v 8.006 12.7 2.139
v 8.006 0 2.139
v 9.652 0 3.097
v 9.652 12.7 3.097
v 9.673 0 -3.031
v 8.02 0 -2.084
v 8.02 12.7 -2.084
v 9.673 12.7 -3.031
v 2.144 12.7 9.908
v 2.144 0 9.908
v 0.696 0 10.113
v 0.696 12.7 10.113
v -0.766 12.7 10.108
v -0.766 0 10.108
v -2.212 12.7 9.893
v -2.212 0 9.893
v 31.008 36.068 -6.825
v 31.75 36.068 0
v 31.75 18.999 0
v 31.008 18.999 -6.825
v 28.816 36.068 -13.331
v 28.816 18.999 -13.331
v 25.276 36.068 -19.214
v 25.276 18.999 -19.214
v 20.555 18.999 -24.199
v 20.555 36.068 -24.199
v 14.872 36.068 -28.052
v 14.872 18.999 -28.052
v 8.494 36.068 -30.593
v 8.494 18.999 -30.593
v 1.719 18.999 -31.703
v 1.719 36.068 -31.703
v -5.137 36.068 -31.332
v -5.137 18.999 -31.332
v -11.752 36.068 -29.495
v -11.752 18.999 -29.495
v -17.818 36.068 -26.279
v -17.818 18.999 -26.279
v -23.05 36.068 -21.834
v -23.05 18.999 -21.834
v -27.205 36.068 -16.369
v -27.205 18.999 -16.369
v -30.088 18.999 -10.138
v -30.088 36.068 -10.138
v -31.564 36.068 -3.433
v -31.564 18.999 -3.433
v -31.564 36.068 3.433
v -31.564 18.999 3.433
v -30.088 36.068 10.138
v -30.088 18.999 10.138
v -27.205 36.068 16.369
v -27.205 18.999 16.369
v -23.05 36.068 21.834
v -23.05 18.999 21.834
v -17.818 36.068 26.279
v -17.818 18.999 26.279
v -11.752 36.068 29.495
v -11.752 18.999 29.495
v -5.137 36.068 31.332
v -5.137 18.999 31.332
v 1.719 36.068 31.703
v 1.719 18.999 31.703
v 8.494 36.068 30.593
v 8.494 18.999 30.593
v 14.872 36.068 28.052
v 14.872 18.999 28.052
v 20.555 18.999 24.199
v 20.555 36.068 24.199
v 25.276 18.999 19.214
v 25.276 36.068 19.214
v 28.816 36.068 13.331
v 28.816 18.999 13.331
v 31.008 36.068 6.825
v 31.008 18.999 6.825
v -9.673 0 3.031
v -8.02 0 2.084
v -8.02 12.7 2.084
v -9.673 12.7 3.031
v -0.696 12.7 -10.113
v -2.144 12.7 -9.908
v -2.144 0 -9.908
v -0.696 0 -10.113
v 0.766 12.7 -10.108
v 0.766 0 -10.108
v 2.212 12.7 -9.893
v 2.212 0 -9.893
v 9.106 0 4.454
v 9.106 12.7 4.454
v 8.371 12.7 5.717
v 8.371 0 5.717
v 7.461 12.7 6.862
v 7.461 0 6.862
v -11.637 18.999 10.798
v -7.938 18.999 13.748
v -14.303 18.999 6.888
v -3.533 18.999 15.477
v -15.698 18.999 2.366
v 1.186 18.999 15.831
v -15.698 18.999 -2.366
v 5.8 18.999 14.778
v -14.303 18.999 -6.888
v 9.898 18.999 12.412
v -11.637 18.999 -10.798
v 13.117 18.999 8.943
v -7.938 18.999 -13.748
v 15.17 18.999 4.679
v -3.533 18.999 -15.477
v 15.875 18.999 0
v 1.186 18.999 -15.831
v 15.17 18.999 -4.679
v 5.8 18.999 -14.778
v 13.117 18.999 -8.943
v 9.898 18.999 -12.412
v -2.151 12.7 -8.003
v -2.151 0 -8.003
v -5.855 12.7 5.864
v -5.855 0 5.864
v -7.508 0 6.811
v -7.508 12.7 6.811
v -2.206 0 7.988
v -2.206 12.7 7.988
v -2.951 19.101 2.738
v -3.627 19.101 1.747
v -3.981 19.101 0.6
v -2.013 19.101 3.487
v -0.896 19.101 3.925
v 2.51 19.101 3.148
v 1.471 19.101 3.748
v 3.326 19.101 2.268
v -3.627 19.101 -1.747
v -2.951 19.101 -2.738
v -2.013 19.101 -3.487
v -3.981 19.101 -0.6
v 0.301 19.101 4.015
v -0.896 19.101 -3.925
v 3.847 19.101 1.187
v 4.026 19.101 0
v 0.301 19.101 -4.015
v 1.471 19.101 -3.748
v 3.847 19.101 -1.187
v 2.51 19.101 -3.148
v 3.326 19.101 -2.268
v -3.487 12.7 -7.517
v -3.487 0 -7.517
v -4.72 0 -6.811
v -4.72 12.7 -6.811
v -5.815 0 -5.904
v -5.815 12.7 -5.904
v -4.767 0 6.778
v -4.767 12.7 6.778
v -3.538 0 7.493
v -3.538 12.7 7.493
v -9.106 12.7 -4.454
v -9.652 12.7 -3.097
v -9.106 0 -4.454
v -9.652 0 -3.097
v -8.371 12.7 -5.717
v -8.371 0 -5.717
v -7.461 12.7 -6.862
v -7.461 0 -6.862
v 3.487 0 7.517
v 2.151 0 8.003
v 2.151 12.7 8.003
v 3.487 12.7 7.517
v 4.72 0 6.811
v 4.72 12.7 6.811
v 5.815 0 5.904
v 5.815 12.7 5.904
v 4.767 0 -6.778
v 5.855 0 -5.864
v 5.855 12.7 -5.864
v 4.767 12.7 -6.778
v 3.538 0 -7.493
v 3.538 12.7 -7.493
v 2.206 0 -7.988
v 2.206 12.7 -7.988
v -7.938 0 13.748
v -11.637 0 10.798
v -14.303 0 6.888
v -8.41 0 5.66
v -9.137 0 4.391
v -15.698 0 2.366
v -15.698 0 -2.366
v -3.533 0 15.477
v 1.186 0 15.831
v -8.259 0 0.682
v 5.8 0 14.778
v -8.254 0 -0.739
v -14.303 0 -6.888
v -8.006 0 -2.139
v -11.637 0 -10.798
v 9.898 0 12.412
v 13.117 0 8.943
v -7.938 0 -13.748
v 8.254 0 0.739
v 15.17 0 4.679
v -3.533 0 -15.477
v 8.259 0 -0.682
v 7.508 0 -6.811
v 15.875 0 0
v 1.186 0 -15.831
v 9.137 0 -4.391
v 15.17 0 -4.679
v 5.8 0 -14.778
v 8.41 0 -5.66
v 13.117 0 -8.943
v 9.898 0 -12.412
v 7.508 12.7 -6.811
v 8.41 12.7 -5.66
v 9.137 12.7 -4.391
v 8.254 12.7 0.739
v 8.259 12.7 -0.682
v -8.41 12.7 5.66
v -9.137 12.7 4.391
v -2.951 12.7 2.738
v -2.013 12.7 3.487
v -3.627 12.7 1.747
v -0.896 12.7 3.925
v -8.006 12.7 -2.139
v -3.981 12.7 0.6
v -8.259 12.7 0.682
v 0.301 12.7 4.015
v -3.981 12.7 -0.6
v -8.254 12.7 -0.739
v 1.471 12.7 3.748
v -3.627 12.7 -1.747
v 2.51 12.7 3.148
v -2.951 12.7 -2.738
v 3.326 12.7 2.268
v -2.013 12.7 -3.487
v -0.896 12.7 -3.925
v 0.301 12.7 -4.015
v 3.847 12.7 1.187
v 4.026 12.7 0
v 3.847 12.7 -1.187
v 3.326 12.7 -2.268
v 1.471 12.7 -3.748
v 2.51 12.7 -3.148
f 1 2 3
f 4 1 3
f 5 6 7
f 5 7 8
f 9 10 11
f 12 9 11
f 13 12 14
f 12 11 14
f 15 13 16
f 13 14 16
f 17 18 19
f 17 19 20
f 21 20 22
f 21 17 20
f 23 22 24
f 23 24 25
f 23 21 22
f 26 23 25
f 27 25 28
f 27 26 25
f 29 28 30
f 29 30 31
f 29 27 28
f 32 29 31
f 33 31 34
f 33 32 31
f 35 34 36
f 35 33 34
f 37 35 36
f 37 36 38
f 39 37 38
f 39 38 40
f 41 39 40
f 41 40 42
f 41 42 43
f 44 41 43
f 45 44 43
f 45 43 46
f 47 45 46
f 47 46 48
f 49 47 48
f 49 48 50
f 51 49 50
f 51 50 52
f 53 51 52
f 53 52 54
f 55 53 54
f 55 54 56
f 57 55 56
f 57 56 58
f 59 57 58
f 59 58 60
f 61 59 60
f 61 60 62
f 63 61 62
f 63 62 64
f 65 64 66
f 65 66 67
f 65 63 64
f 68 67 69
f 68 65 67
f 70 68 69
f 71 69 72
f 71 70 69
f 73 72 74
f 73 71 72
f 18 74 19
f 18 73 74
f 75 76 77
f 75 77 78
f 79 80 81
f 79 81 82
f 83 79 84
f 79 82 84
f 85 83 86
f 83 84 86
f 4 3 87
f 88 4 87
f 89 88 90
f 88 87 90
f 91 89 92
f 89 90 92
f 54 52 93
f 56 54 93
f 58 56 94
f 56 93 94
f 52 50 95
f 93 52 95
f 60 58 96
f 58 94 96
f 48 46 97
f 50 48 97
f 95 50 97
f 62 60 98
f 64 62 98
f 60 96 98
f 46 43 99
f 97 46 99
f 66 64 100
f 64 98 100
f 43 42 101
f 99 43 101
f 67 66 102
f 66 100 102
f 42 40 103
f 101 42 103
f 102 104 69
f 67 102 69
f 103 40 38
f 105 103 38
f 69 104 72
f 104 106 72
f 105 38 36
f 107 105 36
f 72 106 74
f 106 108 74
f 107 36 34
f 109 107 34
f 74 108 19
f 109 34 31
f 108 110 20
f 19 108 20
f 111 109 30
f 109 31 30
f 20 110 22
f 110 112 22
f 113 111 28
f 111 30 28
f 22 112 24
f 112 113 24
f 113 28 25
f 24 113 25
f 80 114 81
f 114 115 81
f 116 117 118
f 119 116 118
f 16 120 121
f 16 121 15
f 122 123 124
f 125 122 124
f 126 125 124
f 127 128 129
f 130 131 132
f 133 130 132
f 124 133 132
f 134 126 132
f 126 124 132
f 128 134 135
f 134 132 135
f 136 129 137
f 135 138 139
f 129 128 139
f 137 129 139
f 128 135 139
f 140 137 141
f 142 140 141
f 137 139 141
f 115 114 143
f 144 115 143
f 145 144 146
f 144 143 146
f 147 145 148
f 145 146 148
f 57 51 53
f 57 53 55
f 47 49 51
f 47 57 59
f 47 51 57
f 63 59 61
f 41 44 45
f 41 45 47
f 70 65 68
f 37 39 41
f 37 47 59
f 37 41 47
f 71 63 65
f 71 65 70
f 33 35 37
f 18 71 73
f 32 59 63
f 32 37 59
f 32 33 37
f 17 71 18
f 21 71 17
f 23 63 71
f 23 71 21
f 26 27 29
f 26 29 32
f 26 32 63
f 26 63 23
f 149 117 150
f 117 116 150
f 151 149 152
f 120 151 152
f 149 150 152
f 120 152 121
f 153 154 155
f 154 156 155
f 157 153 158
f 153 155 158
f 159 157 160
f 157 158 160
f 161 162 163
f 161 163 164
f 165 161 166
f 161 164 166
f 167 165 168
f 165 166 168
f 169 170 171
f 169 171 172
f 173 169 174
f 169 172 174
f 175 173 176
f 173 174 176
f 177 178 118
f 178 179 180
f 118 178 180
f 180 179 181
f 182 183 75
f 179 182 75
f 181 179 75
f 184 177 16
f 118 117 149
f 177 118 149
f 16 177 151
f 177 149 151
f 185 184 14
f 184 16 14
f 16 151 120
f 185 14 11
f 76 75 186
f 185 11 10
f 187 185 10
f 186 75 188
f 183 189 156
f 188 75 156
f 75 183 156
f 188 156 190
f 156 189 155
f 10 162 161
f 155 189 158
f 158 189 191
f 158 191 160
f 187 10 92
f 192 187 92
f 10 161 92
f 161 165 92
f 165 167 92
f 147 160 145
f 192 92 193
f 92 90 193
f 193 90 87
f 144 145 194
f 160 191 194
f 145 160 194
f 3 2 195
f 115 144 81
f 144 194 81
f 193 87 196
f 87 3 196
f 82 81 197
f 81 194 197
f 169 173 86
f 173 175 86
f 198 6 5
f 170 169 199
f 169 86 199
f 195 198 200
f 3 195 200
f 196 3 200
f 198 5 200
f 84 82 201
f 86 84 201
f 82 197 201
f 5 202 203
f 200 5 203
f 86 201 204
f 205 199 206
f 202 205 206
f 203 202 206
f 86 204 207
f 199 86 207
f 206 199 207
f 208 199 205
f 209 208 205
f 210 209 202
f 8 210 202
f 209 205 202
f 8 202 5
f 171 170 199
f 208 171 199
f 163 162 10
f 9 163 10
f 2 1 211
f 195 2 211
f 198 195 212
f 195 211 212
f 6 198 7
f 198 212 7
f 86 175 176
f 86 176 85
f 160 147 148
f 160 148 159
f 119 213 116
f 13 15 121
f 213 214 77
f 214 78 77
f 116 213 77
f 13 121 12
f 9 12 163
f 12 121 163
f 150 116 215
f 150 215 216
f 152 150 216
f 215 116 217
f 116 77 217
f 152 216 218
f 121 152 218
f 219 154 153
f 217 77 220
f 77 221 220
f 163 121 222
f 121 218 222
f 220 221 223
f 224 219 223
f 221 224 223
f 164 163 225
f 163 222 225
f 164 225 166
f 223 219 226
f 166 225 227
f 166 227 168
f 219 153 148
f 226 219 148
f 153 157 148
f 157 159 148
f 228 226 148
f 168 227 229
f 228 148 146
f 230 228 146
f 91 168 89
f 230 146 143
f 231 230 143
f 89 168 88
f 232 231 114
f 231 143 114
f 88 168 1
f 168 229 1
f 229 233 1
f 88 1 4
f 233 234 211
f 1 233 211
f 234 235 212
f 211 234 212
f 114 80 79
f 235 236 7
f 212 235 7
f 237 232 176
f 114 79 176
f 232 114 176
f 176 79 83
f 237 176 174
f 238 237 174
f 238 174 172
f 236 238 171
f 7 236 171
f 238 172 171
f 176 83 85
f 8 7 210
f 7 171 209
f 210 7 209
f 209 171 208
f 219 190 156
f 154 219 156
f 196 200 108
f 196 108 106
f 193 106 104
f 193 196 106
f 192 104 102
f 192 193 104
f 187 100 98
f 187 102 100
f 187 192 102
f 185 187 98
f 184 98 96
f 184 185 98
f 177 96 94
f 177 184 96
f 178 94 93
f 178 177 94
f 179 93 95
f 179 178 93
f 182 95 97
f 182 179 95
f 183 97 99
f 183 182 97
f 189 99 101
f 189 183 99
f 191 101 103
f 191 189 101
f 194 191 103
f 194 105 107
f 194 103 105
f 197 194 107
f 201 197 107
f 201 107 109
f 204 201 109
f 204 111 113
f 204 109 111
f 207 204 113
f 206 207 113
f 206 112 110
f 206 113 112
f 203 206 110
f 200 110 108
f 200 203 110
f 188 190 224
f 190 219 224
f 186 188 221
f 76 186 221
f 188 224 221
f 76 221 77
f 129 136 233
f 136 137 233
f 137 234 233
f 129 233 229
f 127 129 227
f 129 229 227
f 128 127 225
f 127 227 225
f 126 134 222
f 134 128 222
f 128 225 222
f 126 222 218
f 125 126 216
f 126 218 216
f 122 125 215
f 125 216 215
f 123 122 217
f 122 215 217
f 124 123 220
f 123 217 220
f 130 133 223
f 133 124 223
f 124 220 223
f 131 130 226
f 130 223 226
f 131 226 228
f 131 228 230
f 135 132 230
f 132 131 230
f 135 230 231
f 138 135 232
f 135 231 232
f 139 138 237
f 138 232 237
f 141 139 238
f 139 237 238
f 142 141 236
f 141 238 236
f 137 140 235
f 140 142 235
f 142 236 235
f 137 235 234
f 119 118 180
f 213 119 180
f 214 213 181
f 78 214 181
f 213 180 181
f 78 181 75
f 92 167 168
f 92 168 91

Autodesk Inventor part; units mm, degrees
ref_plane "YZ Plane" through (0, 0, 0) normal (1, 0, 0) x (0, 1, 0)
ref_plane "XZ Plane" through (0, 0, 0) normal (0, 1, 0) x (-1, 0, 0)
ref_plane "XY Plane" through (0, 0, 0) normal (0, 0, 1) x (1, 0, 0)
sketch "Sketch1" plane through (0, 0, 0) normal (0, 0, 1) x (1, 0, 0)
  line L0 (0, 0) -> (0, 50.8) construction
  line L1 (0, 0) -> (50.8, 0) construction
  line L2 (31.75, 18.9992) -> (31.75, 19.1008)
  line L3 (0, 9.5479) -> (15.8115, 9.5479) construction
  line L4 (31.75, 18.9992) -> (15.875, 18.9992)
  line L5 (15.875, 18.9992) -> (15.875, 0)
  line L6 (0, 0) -> (8.2867, 0) construction
  line L7 (8.2867, 0) -> (15.875, 0)
  line L8 (8.2867, 0) -> (8.2867, 12.7)
  line L9 (4.0259, 71.0633) -> (4.0259, -11.3243) construction
  line L10 (8.2867, 12.7) -> (4.0259, 12.7)
  line L11 (4.0259, 19.1008) -> (4.0259, 12.7)
  line L12 (31.75, 36.068) -> (31.75, 19.1008)
  line L13 (31.75, 36.068) -> (0, 36.068)
  line L14 (4.0259, 19.1008) -> (0, 19.1008)
  line L15 (0, 36.068) -> (0, 19.1008)
  dimension "d12" = 15.8115
  dimension "d15" = 8.2867
  dimension "d55" = 4.0259
  dimension "d56" = 12.7
  dimension "d95" = 6.4008
revolve "Revolution1" add sketch "Sketch1" angle 360 about axis through (0, 0, 0) along (0, 1, 0)
sketch "Sketch2" plane through (0, 0, 0) normal (0, -1, 0) x (1, 0, 0)
  circle A0 centre (0, 0) radius 8.2867 construction
  line L0 (-2.2055, 7.9879) -> (-2.2121, 9.8928)
  circle A1 centre (0, 0) radius 10.1371 construction
  line L1 (2.1506, 8.0028) -> (2.144, 9.9078)
  line L2 (-2.2055, 7.9879) -> (2.1506, 8.0028) construction
  arc A2 (2.144, 9.9078) -> (-2.2121, 9.8928) centre (0, 0) ccw
  arc A3 (2.1506, 8.0028) -> (-2.2055, 7.9879) centre (0, 0) ccw
  dimension "d43" = 1.905
  dimension "d44" = 4.3561
extrude "Extrusion1" cut sketch "Sketch2" against normal blind 12.7
pattern_circular "Circular Pattern2" count 6 over 360 about axis through (0, 6.35, 0) along (0, -1, 0) of "Extrusion1"
properties part number "denso-basic"
